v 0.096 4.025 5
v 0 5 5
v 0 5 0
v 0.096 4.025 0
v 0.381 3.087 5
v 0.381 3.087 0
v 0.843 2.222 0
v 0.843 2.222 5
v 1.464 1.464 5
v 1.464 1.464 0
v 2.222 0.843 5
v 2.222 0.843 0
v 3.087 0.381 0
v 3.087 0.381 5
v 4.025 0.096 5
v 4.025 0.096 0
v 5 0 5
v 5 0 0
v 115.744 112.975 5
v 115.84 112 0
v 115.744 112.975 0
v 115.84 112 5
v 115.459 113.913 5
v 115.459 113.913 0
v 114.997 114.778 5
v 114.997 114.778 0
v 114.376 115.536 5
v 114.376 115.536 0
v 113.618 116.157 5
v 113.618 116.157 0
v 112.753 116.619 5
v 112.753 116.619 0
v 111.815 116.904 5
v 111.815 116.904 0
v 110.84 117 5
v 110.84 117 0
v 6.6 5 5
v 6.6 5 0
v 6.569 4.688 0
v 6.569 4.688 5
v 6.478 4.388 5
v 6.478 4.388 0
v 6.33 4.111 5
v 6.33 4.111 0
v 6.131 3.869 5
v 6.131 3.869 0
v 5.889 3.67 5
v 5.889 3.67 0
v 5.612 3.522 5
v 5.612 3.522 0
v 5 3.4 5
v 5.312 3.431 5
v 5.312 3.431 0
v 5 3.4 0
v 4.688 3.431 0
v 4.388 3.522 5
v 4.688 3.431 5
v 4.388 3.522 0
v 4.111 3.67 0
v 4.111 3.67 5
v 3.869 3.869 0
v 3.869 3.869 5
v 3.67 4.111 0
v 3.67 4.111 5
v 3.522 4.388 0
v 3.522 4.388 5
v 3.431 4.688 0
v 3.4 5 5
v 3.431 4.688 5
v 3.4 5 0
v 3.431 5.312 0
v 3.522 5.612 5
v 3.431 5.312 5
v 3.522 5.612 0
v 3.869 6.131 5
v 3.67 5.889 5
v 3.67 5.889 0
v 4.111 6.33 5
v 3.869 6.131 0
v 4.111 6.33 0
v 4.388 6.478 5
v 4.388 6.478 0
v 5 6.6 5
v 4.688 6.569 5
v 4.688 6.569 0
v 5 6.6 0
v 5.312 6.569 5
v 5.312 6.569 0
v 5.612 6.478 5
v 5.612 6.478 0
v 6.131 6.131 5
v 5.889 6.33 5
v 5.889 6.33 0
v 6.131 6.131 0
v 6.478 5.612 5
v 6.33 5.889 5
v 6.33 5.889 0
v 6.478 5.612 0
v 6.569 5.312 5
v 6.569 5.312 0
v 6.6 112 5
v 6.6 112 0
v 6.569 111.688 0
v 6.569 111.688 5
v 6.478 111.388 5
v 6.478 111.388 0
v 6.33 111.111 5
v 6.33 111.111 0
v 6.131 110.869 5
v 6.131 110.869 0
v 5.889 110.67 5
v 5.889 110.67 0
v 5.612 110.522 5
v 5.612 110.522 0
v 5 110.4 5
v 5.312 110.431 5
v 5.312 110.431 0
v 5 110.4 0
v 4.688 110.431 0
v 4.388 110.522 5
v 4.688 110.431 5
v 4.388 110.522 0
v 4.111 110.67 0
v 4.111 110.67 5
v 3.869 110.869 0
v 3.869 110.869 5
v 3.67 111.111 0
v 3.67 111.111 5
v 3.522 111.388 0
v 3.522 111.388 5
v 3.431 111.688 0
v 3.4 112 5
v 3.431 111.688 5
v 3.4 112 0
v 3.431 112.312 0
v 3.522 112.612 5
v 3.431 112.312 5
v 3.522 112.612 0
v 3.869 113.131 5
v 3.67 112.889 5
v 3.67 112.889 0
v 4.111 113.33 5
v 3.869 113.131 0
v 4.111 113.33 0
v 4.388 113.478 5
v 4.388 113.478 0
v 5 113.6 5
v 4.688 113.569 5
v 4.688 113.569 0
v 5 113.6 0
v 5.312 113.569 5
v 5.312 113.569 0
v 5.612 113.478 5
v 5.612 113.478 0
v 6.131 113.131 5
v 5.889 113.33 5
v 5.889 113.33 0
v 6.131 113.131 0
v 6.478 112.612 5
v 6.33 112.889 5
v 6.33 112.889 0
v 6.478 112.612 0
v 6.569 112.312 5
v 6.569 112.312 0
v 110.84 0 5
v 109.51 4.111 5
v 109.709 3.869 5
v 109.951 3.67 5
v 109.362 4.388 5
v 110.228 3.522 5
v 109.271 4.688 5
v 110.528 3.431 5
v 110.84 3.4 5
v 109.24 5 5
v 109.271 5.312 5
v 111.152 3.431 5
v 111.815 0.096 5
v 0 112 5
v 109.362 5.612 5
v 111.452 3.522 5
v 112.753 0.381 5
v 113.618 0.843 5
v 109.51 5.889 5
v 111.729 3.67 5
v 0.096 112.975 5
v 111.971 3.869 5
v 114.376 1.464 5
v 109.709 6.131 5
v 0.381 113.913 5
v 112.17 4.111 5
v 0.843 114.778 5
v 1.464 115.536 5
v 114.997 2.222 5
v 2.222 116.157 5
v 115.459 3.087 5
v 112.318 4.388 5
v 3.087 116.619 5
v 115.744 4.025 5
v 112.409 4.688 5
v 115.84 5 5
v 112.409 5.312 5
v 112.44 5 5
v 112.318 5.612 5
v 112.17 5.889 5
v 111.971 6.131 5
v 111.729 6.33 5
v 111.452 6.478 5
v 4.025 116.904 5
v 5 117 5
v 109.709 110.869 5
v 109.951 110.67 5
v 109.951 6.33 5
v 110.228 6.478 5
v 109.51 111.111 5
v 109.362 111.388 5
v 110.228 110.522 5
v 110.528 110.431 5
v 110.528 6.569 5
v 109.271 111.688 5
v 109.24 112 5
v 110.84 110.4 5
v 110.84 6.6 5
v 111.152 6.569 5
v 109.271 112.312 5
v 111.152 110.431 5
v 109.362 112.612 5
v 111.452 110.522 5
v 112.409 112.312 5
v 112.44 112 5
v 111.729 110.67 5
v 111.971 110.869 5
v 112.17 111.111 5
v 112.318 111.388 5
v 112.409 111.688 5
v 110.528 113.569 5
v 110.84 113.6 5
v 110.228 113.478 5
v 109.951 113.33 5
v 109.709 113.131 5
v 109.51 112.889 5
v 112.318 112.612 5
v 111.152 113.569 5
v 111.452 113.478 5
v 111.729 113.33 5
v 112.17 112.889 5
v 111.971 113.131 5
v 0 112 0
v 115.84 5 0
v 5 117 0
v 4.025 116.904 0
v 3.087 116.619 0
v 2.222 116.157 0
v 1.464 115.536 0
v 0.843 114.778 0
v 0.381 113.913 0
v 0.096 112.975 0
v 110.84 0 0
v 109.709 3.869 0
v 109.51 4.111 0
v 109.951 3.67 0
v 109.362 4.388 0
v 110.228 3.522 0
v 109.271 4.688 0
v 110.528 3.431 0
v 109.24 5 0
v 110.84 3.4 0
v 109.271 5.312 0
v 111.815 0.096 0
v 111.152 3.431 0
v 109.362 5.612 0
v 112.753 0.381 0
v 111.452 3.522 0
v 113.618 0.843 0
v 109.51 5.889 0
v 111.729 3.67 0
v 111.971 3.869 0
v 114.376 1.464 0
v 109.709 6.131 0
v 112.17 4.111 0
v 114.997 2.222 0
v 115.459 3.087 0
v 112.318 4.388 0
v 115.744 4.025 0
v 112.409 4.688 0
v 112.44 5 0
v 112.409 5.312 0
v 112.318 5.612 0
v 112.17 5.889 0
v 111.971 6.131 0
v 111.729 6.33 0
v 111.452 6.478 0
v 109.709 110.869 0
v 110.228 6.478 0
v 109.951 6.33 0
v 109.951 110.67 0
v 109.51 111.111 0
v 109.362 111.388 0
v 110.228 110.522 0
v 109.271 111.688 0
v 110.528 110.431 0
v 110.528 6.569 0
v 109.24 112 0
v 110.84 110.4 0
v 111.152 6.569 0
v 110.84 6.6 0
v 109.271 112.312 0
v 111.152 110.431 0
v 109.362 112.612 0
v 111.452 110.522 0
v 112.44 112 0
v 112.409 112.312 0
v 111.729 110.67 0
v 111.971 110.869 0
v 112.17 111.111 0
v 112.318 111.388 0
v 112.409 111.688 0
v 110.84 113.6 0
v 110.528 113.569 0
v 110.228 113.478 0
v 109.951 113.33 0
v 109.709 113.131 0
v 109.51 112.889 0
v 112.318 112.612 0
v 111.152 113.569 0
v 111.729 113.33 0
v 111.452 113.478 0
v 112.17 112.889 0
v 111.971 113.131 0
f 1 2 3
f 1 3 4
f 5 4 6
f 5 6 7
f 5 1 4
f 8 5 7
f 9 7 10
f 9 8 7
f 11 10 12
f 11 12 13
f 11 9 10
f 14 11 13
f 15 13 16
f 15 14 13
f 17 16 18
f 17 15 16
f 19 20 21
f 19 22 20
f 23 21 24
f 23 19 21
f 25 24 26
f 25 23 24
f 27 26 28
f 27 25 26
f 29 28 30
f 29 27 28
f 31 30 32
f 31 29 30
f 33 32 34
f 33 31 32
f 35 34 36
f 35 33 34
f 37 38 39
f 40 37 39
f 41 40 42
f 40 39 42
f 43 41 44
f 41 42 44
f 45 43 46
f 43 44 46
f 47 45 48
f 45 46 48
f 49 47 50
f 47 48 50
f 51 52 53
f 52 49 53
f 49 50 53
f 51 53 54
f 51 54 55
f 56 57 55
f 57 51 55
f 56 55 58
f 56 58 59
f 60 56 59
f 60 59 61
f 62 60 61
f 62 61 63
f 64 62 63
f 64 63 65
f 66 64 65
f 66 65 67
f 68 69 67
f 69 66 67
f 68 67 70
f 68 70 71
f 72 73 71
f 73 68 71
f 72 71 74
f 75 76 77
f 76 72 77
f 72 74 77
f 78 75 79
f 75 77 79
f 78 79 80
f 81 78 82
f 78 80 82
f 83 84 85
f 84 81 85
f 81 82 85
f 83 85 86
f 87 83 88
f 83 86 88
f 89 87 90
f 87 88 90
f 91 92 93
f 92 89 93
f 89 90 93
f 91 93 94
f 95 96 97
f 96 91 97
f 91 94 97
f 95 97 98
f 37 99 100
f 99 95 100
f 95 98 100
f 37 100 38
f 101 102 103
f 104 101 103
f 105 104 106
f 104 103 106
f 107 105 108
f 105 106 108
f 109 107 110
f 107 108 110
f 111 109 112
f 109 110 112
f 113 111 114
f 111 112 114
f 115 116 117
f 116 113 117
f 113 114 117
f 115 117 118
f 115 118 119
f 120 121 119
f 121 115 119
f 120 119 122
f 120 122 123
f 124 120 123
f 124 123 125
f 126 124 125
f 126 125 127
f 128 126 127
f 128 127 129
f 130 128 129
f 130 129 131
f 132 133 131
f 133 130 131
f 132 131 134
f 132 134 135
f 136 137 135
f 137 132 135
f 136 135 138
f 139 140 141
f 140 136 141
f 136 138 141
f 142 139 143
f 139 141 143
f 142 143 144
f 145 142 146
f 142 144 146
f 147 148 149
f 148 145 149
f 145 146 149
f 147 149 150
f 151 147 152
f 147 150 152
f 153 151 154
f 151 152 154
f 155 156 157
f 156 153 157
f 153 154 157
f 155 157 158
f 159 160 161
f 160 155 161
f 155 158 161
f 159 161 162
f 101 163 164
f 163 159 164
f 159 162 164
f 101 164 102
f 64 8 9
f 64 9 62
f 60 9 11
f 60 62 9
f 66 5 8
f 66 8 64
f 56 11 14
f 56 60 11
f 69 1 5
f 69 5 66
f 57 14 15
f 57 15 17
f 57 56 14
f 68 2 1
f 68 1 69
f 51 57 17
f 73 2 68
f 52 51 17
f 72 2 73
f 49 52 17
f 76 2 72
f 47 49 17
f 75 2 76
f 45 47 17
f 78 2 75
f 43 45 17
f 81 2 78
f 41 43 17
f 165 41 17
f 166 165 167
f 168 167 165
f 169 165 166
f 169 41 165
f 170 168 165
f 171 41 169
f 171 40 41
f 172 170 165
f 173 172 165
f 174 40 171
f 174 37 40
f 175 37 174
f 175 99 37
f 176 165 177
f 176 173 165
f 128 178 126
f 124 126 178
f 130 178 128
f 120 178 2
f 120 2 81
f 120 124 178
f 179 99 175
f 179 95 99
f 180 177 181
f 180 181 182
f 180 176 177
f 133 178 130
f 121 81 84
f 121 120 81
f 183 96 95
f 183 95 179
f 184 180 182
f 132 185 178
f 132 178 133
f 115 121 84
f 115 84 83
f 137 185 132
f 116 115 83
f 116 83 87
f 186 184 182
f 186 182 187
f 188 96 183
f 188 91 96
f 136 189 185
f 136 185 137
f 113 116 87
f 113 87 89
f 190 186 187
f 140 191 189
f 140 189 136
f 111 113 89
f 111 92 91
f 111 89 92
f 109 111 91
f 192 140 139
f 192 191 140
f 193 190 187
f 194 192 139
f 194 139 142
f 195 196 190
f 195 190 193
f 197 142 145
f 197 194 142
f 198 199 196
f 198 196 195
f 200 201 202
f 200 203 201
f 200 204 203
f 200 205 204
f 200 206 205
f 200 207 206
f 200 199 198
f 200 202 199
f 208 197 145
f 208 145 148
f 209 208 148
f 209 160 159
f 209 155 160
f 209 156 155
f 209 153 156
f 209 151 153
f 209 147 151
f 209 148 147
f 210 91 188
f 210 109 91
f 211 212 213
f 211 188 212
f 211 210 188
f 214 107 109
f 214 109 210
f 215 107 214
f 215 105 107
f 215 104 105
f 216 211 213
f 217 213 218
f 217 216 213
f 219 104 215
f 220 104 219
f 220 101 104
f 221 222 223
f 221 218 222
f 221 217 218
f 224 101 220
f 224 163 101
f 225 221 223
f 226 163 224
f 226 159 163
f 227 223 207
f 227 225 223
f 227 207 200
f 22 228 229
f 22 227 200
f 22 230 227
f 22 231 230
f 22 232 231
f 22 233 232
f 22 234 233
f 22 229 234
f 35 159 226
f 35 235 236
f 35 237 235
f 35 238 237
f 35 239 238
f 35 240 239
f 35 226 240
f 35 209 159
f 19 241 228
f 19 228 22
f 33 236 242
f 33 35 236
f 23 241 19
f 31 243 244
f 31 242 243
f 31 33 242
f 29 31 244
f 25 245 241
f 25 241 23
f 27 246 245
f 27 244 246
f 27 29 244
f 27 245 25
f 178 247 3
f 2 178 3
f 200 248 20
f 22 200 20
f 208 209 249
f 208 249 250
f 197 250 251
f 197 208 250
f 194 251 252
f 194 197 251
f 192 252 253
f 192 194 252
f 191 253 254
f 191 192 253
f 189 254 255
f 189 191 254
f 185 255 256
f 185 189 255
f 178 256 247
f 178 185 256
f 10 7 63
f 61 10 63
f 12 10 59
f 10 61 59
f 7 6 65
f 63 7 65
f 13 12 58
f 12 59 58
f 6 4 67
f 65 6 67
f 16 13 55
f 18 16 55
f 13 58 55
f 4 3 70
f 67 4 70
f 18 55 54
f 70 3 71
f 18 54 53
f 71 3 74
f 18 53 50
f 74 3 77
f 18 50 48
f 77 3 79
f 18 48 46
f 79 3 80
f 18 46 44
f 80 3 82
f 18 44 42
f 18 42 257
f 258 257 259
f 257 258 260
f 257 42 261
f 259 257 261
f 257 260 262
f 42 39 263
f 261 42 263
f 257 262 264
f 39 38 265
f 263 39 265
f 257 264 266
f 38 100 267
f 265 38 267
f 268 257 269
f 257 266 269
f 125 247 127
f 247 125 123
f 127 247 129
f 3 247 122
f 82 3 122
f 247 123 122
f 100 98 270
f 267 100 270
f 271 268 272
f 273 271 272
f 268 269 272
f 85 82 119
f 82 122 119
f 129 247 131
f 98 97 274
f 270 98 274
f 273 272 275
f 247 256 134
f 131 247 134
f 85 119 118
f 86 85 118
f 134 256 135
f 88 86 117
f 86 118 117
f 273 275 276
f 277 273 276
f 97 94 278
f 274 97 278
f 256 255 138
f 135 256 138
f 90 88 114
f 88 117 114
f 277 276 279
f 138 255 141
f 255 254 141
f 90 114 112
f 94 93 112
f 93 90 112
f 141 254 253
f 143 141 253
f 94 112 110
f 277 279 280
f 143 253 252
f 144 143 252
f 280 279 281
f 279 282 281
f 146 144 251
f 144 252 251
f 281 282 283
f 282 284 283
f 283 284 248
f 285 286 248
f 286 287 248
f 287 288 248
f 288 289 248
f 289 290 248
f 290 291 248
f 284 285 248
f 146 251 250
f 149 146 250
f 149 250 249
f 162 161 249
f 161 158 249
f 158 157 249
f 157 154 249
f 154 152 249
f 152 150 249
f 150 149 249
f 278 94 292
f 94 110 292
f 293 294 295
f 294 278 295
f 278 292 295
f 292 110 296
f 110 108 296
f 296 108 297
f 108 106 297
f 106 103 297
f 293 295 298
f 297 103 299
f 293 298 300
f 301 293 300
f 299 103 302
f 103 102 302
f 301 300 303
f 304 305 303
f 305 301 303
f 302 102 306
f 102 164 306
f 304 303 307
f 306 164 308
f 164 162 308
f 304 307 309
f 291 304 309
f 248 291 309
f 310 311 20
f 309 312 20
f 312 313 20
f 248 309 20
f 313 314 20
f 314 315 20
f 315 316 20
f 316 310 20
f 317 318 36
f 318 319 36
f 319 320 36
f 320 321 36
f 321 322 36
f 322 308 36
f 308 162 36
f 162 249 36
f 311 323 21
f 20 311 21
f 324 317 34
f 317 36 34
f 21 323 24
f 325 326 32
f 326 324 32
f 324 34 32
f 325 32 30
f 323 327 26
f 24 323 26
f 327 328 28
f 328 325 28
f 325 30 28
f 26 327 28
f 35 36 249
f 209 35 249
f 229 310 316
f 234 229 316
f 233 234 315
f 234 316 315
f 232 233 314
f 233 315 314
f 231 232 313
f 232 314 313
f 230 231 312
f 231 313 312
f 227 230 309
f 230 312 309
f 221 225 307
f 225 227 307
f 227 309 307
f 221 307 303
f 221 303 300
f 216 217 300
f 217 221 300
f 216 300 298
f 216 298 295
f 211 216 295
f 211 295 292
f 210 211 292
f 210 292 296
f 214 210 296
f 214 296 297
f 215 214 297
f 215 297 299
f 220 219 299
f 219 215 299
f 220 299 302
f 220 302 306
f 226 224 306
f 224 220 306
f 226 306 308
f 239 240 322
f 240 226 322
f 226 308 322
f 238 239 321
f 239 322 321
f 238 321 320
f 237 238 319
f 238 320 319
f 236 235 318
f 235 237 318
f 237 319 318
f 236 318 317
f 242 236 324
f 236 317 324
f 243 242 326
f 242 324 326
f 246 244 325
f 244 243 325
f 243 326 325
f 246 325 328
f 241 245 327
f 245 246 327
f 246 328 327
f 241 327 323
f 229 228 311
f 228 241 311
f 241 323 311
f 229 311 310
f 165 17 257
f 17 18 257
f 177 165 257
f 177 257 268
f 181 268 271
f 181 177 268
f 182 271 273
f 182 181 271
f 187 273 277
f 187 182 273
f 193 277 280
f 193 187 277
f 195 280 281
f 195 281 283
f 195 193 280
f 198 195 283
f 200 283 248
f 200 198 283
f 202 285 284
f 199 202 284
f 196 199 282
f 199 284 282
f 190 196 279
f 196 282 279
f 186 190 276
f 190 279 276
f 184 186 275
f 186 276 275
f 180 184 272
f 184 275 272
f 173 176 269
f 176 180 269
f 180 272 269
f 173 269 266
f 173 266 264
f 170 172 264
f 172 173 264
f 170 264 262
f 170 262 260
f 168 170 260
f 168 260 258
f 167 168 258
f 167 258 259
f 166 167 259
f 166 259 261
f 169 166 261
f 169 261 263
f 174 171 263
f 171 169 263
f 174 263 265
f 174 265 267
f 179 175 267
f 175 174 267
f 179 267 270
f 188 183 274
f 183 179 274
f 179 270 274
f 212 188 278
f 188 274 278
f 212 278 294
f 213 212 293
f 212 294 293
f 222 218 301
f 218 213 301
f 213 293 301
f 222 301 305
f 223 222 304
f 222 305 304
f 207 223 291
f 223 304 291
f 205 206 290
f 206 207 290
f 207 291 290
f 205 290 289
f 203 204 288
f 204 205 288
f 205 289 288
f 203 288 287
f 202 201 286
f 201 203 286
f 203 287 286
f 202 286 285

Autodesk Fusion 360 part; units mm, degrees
sketch "Sketch1" plane through (0, 0, 0) normal (0, 0, 1) x (1, 0, 0)
  line L0 (0, 0) -> (115.84, 0)
  line L1 (115.84, 0) -> (115.84, 117)
  line L2 (115.84, 117) -> (0, 117)
  line L3 (0, 117) -> (0, 0)
  line L4 (10, 7) -> (105.84, 7)
  line L5 (105.84, 7) -> (105.84, 112)
  line L6 (105.84, 112) -> (10, 112)
  line L7 (10, 112) -> (10, 7)
  circle A0 centre (5, 112) radius 1.6
  circle A1 centre (5, 5) radius 1.6
  circle A2 centre (110.84, 5) radius 1.6
  circle A3 centre (110.84, 112) radius 1.6
  dimension "d1" = 115.84
  dimension "d2" = 117
  dimension "d3" = 95.84
  dimension "d4" = 105
  dimension "d6" = 10
  dimension "d7" = 5
  dimension "d8" = 3.2
  dimension "d9" = 5
  dimension "d10" = 5
  dimension "d11" = 3.2
  dimension "d12" = 5
  dimension "d13" = 5
  dimension "d14" = 3.2
  dimension "d15" = 5
  dimension "d16" = 5
  dimension "d17" = 3.2
  dimension "d18" = 5
  dimension "d19" = 5
extrude "Extrude1" add sketch "Sketch1" along normal blind 5 contours L0 L1 L2 L3 | L4 L5 L6 L7
fillet "Fillet1" radius 5 4 edges at (115.84, 117, 2.5) (115.84, 0, 2.5) (0, 117, 2.5) (0, 0, 2.5)
